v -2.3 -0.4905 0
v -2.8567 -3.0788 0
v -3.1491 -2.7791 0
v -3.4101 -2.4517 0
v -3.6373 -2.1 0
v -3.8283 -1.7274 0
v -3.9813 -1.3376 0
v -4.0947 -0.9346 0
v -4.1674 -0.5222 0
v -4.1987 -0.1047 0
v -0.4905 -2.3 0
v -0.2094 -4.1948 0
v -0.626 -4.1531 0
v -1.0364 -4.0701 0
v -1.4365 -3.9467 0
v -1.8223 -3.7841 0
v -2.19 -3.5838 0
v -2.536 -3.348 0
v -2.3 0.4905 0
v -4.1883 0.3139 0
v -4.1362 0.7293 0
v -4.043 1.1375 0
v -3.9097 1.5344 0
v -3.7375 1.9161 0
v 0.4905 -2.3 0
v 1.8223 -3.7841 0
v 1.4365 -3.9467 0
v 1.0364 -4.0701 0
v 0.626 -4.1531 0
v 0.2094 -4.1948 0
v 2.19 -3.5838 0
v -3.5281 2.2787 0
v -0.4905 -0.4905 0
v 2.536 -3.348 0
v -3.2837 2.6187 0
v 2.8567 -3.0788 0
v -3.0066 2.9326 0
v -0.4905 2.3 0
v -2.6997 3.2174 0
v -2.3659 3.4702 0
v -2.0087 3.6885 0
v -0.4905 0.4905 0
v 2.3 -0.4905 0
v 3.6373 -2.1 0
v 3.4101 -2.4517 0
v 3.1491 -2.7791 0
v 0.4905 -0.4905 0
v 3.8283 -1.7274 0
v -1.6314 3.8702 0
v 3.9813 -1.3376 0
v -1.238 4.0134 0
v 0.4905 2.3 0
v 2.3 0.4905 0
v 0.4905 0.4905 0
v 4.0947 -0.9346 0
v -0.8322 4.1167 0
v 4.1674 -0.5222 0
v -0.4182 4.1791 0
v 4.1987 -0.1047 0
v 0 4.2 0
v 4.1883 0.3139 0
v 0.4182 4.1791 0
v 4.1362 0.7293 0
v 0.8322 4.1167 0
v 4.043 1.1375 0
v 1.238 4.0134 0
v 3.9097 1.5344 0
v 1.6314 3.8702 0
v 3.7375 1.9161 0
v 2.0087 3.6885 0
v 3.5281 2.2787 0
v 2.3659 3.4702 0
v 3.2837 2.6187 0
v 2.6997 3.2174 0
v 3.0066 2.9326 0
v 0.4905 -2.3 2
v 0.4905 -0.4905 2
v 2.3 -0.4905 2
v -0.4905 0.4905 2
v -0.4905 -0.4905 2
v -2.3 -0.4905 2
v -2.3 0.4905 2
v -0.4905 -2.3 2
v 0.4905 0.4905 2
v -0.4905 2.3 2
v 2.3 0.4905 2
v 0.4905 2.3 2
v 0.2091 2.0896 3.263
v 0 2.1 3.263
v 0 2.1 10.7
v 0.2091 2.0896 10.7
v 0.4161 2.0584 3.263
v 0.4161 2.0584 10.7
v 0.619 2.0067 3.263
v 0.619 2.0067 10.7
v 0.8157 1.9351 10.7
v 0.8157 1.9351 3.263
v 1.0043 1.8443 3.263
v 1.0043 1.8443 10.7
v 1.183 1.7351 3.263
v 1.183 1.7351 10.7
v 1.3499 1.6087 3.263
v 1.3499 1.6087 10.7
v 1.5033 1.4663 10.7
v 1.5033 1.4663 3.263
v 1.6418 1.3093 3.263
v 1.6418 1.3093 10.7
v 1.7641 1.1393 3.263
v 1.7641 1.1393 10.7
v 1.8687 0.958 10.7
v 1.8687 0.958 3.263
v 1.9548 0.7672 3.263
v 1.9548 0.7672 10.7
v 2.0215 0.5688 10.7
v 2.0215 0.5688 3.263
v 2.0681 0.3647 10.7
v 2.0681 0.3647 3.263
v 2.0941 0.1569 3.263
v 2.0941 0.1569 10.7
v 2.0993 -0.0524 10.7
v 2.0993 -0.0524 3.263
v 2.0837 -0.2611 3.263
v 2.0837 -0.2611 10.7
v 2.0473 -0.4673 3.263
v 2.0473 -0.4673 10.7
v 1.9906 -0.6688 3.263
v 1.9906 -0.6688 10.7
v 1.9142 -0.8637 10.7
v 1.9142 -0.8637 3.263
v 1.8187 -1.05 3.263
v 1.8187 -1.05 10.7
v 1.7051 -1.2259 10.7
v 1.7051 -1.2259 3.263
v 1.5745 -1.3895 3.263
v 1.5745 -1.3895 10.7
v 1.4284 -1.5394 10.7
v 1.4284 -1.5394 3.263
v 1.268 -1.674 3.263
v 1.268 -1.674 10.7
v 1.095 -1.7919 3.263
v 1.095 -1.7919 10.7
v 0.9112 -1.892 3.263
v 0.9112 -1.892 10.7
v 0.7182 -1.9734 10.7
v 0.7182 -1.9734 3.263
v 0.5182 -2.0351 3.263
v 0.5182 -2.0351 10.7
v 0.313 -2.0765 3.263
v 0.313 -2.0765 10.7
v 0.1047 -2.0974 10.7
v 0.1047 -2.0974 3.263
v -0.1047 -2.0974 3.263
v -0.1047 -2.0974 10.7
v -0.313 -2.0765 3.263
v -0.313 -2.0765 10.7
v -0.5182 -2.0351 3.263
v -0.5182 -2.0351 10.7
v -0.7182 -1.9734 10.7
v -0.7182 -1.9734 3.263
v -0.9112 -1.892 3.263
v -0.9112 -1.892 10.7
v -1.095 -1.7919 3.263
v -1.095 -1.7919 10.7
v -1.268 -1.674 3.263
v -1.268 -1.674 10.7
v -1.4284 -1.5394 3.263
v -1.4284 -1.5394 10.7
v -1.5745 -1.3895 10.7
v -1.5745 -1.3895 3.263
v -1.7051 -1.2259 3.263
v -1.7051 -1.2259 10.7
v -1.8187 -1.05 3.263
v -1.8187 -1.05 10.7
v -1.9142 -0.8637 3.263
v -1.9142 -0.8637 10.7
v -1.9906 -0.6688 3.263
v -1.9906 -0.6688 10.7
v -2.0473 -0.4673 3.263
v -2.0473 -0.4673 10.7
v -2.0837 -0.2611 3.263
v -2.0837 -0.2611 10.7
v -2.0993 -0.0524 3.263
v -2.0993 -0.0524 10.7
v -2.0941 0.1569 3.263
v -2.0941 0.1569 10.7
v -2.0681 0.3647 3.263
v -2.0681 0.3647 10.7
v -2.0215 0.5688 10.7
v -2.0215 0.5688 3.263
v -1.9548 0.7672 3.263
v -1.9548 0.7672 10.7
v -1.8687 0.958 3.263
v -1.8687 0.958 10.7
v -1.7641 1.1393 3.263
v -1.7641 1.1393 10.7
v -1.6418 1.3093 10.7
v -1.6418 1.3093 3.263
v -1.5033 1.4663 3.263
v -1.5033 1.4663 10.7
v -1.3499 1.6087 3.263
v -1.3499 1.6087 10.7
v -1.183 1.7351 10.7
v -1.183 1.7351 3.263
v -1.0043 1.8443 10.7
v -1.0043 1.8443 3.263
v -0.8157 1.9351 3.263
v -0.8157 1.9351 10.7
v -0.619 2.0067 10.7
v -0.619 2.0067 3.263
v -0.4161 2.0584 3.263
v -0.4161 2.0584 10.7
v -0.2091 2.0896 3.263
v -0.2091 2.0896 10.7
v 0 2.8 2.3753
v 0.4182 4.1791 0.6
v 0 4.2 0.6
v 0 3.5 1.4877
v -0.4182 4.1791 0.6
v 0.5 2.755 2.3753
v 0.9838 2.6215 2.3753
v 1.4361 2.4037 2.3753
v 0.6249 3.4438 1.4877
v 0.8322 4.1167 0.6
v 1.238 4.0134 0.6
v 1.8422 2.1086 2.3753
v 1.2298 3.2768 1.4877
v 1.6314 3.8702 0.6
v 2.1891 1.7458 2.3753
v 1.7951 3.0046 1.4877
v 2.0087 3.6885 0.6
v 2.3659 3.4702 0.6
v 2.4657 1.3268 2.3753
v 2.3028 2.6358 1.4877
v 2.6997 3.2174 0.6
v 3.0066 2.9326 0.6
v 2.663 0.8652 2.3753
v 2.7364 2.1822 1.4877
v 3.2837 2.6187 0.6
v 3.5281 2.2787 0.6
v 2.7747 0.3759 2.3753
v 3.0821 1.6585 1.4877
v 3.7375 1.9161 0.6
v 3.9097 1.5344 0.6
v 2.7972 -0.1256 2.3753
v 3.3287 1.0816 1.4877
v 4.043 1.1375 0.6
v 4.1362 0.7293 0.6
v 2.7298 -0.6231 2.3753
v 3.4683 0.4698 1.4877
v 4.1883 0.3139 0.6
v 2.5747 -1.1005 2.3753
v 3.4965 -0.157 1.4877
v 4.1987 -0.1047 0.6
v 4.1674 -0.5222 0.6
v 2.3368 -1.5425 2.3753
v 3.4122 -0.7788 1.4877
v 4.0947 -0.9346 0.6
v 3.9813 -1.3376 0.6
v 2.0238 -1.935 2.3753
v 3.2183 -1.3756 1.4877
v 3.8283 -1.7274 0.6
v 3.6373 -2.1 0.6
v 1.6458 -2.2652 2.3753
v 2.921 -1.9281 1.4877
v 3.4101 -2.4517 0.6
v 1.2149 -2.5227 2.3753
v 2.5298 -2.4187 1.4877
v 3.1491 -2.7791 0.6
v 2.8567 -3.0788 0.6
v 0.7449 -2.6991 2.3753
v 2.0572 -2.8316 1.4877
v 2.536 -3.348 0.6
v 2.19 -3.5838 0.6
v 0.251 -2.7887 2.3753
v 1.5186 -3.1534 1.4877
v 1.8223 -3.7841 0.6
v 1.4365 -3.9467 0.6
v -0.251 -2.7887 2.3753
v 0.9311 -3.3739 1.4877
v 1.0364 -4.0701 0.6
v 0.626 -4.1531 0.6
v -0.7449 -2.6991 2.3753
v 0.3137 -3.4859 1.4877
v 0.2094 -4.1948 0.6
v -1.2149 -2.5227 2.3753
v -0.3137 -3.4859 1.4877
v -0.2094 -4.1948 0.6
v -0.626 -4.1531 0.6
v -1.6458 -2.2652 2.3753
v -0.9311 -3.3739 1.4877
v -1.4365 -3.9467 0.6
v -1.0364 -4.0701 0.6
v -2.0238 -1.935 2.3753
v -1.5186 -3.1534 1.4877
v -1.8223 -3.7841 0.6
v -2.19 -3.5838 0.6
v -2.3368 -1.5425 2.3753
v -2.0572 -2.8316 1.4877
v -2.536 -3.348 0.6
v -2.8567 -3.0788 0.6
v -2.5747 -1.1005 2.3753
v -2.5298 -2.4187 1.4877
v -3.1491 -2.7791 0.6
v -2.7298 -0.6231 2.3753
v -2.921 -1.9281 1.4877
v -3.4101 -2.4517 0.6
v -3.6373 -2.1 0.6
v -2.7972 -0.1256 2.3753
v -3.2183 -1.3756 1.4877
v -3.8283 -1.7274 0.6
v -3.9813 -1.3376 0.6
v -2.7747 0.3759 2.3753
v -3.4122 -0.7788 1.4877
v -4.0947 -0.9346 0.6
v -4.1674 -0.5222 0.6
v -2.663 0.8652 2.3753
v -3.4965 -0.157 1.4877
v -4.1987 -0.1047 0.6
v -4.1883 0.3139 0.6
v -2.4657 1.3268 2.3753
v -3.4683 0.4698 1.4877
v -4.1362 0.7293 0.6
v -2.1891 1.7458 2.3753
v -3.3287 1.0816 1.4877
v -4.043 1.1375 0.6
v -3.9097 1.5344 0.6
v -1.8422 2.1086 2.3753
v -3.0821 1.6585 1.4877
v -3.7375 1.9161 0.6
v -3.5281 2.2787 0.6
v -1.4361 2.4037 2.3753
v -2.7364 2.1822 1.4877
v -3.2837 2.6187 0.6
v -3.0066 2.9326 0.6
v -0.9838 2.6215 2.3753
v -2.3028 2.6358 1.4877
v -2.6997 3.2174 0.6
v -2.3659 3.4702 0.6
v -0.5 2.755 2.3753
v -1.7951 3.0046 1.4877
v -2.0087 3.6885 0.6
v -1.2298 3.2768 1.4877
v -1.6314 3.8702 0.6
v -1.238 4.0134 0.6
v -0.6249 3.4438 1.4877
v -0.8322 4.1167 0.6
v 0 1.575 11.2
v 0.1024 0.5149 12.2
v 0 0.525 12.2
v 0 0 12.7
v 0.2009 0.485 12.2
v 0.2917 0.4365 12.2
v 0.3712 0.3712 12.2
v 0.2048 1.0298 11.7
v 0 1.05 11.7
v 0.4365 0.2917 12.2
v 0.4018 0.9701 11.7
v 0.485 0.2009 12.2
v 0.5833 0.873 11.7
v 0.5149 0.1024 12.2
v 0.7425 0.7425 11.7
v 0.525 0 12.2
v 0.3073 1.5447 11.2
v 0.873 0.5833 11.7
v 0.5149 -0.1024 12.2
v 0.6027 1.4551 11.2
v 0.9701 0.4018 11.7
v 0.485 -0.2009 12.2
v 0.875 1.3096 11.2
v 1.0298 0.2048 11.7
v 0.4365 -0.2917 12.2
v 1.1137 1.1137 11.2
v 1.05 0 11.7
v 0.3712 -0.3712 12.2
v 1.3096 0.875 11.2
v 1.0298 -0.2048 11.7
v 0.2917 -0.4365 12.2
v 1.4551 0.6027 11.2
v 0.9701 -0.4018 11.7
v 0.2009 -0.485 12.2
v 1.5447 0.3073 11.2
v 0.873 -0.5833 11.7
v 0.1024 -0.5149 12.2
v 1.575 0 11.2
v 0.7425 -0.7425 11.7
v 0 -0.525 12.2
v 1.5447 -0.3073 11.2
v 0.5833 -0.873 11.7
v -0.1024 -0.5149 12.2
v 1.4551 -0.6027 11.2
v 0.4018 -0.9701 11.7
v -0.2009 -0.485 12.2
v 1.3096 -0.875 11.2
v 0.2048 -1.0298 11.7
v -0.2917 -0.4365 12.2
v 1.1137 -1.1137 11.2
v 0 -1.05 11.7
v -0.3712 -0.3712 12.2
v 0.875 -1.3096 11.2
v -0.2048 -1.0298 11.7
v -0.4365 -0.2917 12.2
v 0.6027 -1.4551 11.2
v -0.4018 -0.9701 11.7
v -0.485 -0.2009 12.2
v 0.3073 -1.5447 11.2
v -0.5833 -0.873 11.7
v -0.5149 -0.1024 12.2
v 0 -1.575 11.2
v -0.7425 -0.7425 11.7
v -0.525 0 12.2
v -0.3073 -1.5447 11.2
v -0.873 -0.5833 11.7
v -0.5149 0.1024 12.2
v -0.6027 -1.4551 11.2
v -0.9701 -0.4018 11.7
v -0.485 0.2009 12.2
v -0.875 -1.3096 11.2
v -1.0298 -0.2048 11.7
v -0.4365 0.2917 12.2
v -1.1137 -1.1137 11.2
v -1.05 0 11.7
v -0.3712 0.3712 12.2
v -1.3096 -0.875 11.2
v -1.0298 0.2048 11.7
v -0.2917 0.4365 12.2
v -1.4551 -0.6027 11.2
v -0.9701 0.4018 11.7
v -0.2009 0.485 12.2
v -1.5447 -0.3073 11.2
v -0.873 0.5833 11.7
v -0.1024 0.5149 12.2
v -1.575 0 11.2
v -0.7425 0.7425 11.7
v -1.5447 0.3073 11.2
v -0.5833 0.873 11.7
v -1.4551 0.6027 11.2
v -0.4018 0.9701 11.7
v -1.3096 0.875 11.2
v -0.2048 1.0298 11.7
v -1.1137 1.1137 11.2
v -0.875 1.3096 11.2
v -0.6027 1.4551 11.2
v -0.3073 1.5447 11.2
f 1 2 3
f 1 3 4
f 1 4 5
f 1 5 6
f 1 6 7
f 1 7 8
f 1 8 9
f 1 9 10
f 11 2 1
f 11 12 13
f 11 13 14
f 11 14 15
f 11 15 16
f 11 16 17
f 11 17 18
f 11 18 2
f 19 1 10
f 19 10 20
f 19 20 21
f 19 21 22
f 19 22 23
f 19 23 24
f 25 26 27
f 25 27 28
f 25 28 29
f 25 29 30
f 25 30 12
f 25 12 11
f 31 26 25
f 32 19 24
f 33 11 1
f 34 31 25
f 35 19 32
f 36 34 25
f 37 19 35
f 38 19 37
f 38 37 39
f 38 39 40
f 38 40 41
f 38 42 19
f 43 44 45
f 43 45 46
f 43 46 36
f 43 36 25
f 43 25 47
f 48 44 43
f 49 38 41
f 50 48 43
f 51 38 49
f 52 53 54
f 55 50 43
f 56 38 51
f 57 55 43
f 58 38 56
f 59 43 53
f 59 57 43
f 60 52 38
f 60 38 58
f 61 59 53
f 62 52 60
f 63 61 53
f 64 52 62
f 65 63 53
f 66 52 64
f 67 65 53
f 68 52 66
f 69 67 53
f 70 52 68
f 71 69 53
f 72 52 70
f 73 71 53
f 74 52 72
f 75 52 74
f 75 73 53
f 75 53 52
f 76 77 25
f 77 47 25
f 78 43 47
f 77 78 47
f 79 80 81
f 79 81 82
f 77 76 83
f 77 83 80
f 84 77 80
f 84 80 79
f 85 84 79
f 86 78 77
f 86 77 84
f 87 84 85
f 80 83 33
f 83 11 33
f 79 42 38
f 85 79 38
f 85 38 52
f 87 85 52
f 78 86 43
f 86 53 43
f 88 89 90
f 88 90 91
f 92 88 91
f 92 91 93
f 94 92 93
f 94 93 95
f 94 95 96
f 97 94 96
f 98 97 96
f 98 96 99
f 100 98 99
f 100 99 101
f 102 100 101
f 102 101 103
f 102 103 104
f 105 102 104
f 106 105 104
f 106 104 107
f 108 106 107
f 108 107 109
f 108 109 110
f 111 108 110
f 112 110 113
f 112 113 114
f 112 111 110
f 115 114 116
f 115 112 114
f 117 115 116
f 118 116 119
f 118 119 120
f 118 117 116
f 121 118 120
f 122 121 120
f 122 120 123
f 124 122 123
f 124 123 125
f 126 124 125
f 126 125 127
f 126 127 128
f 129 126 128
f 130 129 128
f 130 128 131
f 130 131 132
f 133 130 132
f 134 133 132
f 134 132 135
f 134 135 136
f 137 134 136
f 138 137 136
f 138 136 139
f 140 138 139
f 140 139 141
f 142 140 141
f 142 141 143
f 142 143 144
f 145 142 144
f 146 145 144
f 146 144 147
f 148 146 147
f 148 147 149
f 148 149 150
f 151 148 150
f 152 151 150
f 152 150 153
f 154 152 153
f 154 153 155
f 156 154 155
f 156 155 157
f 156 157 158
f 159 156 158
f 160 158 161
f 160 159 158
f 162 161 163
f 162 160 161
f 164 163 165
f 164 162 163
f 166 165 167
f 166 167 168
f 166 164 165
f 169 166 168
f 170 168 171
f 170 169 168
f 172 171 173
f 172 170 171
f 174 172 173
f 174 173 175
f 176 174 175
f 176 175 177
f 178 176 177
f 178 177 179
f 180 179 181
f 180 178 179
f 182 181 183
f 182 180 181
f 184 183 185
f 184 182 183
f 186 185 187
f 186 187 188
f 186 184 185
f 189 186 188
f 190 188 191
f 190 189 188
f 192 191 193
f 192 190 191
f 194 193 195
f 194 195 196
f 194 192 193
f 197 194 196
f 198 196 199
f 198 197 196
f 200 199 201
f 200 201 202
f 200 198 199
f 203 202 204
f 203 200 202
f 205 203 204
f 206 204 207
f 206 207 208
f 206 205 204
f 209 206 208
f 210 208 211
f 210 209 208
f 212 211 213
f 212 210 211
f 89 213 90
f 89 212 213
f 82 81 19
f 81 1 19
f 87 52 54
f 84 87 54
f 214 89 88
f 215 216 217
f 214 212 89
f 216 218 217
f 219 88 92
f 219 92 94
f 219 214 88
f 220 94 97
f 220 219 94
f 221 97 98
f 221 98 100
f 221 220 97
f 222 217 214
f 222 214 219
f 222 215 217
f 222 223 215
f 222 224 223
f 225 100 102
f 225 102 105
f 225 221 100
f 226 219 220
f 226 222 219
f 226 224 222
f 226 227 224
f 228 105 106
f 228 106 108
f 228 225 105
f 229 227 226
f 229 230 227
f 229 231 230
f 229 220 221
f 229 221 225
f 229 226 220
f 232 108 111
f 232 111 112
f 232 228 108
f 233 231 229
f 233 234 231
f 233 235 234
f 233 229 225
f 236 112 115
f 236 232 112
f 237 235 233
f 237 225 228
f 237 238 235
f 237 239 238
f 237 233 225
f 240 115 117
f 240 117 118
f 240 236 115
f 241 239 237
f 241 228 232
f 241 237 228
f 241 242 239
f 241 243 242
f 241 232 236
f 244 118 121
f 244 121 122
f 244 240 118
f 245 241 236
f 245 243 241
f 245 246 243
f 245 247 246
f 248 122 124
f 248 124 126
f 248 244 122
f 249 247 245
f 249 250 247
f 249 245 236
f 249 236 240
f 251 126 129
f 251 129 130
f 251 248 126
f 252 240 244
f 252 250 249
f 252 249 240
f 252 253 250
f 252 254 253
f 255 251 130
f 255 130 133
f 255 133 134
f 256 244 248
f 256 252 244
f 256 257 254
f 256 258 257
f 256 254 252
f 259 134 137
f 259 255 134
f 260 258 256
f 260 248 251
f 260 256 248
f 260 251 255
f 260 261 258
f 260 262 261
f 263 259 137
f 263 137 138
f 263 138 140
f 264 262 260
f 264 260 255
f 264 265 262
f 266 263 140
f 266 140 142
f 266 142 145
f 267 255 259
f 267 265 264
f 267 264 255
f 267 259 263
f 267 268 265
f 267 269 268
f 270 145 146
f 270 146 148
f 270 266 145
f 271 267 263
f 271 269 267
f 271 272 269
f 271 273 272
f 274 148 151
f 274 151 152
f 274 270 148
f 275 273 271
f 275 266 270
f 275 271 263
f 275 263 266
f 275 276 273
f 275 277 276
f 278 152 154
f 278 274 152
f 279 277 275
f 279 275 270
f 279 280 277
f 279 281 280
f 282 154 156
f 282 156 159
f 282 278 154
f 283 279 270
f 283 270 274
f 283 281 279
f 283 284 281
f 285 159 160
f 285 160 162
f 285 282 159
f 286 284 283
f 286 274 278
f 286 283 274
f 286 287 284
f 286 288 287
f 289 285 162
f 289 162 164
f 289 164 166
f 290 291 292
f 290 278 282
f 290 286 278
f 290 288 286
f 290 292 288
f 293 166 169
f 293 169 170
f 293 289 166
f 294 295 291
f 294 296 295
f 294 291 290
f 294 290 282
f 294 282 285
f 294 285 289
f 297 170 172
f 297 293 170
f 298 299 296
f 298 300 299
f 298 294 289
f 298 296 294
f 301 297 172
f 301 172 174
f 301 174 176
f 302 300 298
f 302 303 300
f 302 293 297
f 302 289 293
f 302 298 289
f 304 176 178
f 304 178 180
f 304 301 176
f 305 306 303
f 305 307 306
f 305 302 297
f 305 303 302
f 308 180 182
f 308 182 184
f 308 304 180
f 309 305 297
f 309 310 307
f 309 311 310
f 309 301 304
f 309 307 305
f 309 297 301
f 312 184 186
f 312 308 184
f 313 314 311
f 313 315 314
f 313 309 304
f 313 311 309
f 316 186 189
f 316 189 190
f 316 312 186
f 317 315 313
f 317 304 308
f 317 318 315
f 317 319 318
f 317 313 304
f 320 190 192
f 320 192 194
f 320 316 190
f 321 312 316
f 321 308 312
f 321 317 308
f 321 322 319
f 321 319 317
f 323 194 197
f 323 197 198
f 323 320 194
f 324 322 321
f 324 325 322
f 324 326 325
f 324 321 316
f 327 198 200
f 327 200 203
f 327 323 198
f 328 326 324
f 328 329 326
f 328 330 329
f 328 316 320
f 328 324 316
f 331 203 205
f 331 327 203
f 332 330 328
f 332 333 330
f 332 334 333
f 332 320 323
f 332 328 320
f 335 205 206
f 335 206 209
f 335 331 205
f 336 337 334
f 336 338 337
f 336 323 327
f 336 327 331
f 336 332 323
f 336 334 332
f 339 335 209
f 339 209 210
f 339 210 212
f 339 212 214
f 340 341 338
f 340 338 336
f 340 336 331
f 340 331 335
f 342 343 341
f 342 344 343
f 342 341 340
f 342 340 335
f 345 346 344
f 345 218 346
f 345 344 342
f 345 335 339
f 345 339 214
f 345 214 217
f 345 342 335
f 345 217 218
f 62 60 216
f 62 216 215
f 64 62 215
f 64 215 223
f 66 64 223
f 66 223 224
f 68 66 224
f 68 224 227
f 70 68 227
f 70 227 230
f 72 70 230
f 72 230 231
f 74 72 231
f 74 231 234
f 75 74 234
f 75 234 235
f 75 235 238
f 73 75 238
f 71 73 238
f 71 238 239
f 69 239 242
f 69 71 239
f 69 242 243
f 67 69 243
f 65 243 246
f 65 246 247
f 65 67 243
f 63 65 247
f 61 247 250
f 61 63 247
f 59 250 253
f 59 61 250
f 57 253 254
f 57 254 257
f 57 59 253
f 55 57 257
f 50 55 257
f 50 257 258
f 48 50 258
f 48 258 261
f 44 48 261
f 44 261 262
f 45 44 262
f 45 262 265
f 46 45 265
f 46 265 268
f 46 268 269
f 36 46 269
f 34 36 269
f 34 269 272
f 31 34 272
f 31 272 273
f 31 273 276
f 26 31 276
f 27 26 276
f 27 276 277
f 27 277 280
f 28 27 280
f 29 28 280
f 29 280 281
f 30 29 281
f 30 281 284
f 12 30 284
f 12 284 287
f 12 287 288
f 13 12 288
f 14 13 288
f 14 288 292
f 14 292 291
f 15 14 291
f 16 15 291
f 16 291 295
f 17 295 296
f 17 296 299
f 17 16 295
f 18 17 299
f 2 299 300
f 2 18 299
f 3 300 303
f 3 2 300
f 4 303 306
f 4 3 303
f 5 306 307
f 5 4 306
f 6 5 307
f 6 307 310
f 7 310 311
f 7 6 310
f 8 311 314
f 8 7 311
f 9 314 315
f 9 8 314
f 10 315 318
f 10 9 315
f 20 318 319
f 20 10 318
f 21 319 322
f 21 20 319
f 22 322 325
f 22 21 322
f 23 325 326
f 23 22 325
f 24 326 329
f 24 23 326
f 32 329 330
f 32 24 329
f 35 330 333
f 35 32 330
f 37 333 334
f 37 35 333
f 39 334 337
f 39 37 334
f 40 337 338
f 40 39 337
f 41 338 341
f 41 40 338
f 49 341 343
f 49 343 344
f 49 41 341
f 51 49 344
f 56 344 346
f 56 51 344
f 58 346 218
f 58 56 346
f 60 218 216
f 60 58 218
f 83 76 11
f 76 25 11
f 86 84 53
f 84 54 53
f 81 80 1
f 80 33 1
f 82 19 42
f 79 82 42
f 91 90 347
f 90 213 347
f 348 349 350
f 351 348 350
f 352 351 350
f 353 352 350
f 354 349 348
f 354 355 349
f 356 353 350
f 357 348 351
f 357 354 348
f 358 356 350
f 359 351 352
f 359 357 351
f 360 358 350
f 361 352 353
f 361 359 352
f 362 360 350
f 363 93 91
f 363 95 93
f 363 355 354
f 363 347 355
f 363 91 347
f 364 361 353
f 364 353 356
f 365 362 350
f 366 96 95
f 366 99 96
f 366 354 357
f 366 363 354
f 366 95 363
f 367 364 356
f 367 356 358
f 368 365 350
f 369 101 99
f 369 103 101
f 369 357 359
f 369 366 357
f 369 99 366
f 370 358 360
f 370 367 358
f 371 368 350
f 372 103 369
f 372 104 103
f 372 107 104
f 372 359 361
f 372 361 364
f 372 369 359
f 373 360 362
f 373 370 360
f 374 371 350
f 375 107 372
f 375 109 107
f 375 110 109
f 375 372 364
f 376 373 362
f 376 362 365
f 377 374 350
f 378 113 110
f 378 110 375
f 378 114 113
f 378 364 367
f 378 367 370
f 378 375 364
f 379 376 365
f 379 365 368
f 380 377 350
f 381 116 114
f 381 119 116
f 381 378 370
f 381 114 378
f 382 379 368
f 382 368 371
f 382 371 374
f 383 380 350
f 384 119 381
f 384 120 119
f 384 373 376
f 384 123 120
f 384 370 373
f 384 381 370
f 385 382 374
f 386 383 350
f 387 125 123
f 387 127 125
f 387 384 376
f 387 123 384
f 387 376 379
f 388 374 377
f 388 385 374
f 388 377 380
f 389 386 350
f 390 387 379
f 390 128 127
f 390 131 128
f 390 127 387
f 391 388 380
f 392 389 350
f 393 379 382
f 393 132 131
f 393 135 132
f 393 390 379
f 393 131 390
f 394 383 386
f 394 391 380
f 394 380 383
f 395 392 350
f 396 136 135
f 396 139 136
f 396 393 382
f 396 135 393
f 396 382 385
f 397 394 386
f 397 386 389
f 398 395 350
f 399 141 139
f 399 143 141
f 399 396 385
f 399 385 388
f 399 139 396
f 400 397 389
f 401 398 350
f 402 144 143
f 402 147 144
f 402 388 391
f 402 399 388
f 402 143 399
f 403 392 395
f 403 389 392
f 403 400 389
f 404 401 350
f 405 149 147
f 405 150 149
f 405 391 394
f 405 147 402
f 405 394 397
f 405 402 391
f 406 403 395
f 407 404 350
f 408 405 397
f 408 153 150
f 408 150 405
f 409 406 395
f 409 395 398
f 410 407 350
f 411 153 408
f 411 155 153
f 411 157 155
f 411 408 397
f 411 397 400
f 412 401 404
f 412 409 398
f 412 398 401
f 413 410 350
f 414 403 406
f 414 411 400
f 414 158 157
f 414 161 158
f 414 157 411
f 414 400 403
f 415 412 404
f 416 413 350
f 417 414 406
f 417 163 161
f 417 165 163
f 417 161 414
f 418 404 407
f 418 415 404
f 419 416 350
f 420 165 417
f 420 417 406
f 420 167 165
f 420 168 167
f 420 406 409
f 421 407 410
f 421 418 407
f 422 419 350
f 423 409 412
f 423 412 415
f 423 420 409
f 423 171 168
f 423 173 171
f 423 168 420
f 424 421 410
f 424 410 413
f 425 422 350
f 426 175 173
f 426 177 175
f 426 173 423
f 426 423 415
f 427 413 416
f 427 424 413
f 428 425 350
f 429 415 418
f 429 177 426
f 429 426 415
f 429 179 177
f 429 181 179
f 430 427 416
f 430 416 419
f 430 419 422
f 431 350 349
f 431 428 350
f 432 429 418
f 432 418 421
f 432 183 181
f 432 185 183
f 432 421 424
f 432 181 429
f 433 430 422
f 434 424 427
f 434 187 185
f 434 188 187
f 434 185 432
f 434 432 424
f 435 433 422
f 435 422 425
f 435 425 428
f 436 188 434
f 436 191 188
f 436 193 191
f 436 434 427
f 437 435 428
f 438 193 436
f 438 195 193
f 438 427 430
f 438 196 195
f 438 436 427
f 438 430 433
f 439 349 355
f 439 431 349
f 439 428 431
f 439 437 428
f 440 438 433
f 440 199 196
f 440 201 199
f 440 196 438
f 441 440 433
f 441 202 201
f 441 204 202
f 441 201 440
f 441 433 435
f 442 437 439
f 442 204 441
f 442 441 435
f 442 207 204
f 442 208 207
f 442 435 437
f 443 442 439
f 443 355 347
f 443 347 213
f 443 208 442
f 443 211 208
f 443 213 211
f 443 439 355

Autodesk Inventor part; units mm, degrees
sketch "Sketch_1" plane through (0, 0, 0) normal (1, 0, 0) x (0, 1, 0)
  line L0 (0, 0) -> (0, 12.7)
  line L1 (0, 12.7) -> (2.1, 10.7)
  line L2 (2.1, 10.7) -> (2.1, 3.263)
  line L3 (2.1, 3.263) -> (4.2, 0.6)
  line L4 (4.2, 0.6) -> (4.2, 0)
  line L5 (4.2, 0) -> (0, 0)
  line L6 (0, 0) -> (0, 12.7)
revolve "Revolution1" add sketch "Sketch_1" angle 360 about axis through (0, 0, 0) along (0, 0, -1)
sketch "Sketch_3" plane through (0, 0, 0) normal (0, 0, -1) x (0, 1, 0)
  line L0 (-2.3, -0.4905) -> (-0.4905, -0.4905)
  line L1 (-0.4905, -0.4905) -> (-0.4905, -2.3)
  line L2 (-0.4905, -2.3) -> (0.4905, -2.3)
  line L3 (0.4905, -2.3) -> (0.4905, -0.4905)
  line L4 (0.4905, -0.4905) -> (2.3, -0.4905)
  line L5 (2.3, -0.4905) -> (2.3, 0.4905)
  line L6 (2.3, 0.4905) -> (0.4905, 0.4905)
  line L7 (0.4905, 0.4905) -> (0.4905, 2.3)
  line L8 (0.4905, 2.3) -> (-0.4905, 2.3)
  line L9 (-0.4905, 2.3) -> (-0.4905, 0.4905)
  line L10 (-0.4905, 0.4905) -> (-2.3, 0.4905)
  line L11 (-2.3, 0.4905) -> (-2.3, -0.4905)
extrude "Extrusion1" cut sketch "Sketch_3" against normal blind 2
ref_plane "CS_ANBAU_XY" through (0, 0, 0) normal (0, 0, -1) x (0, 1, 0)
ref_plane "CS_ANBAU_YZ" through (0, 0, 0) normal (0, 1, 0) x (1, 0, 0)
ref_plane "CS_ANBAU_ZX" through (0, 0, 0) normal (1, 0, 0) x (0, 0, -1)
properties part number "100031"
